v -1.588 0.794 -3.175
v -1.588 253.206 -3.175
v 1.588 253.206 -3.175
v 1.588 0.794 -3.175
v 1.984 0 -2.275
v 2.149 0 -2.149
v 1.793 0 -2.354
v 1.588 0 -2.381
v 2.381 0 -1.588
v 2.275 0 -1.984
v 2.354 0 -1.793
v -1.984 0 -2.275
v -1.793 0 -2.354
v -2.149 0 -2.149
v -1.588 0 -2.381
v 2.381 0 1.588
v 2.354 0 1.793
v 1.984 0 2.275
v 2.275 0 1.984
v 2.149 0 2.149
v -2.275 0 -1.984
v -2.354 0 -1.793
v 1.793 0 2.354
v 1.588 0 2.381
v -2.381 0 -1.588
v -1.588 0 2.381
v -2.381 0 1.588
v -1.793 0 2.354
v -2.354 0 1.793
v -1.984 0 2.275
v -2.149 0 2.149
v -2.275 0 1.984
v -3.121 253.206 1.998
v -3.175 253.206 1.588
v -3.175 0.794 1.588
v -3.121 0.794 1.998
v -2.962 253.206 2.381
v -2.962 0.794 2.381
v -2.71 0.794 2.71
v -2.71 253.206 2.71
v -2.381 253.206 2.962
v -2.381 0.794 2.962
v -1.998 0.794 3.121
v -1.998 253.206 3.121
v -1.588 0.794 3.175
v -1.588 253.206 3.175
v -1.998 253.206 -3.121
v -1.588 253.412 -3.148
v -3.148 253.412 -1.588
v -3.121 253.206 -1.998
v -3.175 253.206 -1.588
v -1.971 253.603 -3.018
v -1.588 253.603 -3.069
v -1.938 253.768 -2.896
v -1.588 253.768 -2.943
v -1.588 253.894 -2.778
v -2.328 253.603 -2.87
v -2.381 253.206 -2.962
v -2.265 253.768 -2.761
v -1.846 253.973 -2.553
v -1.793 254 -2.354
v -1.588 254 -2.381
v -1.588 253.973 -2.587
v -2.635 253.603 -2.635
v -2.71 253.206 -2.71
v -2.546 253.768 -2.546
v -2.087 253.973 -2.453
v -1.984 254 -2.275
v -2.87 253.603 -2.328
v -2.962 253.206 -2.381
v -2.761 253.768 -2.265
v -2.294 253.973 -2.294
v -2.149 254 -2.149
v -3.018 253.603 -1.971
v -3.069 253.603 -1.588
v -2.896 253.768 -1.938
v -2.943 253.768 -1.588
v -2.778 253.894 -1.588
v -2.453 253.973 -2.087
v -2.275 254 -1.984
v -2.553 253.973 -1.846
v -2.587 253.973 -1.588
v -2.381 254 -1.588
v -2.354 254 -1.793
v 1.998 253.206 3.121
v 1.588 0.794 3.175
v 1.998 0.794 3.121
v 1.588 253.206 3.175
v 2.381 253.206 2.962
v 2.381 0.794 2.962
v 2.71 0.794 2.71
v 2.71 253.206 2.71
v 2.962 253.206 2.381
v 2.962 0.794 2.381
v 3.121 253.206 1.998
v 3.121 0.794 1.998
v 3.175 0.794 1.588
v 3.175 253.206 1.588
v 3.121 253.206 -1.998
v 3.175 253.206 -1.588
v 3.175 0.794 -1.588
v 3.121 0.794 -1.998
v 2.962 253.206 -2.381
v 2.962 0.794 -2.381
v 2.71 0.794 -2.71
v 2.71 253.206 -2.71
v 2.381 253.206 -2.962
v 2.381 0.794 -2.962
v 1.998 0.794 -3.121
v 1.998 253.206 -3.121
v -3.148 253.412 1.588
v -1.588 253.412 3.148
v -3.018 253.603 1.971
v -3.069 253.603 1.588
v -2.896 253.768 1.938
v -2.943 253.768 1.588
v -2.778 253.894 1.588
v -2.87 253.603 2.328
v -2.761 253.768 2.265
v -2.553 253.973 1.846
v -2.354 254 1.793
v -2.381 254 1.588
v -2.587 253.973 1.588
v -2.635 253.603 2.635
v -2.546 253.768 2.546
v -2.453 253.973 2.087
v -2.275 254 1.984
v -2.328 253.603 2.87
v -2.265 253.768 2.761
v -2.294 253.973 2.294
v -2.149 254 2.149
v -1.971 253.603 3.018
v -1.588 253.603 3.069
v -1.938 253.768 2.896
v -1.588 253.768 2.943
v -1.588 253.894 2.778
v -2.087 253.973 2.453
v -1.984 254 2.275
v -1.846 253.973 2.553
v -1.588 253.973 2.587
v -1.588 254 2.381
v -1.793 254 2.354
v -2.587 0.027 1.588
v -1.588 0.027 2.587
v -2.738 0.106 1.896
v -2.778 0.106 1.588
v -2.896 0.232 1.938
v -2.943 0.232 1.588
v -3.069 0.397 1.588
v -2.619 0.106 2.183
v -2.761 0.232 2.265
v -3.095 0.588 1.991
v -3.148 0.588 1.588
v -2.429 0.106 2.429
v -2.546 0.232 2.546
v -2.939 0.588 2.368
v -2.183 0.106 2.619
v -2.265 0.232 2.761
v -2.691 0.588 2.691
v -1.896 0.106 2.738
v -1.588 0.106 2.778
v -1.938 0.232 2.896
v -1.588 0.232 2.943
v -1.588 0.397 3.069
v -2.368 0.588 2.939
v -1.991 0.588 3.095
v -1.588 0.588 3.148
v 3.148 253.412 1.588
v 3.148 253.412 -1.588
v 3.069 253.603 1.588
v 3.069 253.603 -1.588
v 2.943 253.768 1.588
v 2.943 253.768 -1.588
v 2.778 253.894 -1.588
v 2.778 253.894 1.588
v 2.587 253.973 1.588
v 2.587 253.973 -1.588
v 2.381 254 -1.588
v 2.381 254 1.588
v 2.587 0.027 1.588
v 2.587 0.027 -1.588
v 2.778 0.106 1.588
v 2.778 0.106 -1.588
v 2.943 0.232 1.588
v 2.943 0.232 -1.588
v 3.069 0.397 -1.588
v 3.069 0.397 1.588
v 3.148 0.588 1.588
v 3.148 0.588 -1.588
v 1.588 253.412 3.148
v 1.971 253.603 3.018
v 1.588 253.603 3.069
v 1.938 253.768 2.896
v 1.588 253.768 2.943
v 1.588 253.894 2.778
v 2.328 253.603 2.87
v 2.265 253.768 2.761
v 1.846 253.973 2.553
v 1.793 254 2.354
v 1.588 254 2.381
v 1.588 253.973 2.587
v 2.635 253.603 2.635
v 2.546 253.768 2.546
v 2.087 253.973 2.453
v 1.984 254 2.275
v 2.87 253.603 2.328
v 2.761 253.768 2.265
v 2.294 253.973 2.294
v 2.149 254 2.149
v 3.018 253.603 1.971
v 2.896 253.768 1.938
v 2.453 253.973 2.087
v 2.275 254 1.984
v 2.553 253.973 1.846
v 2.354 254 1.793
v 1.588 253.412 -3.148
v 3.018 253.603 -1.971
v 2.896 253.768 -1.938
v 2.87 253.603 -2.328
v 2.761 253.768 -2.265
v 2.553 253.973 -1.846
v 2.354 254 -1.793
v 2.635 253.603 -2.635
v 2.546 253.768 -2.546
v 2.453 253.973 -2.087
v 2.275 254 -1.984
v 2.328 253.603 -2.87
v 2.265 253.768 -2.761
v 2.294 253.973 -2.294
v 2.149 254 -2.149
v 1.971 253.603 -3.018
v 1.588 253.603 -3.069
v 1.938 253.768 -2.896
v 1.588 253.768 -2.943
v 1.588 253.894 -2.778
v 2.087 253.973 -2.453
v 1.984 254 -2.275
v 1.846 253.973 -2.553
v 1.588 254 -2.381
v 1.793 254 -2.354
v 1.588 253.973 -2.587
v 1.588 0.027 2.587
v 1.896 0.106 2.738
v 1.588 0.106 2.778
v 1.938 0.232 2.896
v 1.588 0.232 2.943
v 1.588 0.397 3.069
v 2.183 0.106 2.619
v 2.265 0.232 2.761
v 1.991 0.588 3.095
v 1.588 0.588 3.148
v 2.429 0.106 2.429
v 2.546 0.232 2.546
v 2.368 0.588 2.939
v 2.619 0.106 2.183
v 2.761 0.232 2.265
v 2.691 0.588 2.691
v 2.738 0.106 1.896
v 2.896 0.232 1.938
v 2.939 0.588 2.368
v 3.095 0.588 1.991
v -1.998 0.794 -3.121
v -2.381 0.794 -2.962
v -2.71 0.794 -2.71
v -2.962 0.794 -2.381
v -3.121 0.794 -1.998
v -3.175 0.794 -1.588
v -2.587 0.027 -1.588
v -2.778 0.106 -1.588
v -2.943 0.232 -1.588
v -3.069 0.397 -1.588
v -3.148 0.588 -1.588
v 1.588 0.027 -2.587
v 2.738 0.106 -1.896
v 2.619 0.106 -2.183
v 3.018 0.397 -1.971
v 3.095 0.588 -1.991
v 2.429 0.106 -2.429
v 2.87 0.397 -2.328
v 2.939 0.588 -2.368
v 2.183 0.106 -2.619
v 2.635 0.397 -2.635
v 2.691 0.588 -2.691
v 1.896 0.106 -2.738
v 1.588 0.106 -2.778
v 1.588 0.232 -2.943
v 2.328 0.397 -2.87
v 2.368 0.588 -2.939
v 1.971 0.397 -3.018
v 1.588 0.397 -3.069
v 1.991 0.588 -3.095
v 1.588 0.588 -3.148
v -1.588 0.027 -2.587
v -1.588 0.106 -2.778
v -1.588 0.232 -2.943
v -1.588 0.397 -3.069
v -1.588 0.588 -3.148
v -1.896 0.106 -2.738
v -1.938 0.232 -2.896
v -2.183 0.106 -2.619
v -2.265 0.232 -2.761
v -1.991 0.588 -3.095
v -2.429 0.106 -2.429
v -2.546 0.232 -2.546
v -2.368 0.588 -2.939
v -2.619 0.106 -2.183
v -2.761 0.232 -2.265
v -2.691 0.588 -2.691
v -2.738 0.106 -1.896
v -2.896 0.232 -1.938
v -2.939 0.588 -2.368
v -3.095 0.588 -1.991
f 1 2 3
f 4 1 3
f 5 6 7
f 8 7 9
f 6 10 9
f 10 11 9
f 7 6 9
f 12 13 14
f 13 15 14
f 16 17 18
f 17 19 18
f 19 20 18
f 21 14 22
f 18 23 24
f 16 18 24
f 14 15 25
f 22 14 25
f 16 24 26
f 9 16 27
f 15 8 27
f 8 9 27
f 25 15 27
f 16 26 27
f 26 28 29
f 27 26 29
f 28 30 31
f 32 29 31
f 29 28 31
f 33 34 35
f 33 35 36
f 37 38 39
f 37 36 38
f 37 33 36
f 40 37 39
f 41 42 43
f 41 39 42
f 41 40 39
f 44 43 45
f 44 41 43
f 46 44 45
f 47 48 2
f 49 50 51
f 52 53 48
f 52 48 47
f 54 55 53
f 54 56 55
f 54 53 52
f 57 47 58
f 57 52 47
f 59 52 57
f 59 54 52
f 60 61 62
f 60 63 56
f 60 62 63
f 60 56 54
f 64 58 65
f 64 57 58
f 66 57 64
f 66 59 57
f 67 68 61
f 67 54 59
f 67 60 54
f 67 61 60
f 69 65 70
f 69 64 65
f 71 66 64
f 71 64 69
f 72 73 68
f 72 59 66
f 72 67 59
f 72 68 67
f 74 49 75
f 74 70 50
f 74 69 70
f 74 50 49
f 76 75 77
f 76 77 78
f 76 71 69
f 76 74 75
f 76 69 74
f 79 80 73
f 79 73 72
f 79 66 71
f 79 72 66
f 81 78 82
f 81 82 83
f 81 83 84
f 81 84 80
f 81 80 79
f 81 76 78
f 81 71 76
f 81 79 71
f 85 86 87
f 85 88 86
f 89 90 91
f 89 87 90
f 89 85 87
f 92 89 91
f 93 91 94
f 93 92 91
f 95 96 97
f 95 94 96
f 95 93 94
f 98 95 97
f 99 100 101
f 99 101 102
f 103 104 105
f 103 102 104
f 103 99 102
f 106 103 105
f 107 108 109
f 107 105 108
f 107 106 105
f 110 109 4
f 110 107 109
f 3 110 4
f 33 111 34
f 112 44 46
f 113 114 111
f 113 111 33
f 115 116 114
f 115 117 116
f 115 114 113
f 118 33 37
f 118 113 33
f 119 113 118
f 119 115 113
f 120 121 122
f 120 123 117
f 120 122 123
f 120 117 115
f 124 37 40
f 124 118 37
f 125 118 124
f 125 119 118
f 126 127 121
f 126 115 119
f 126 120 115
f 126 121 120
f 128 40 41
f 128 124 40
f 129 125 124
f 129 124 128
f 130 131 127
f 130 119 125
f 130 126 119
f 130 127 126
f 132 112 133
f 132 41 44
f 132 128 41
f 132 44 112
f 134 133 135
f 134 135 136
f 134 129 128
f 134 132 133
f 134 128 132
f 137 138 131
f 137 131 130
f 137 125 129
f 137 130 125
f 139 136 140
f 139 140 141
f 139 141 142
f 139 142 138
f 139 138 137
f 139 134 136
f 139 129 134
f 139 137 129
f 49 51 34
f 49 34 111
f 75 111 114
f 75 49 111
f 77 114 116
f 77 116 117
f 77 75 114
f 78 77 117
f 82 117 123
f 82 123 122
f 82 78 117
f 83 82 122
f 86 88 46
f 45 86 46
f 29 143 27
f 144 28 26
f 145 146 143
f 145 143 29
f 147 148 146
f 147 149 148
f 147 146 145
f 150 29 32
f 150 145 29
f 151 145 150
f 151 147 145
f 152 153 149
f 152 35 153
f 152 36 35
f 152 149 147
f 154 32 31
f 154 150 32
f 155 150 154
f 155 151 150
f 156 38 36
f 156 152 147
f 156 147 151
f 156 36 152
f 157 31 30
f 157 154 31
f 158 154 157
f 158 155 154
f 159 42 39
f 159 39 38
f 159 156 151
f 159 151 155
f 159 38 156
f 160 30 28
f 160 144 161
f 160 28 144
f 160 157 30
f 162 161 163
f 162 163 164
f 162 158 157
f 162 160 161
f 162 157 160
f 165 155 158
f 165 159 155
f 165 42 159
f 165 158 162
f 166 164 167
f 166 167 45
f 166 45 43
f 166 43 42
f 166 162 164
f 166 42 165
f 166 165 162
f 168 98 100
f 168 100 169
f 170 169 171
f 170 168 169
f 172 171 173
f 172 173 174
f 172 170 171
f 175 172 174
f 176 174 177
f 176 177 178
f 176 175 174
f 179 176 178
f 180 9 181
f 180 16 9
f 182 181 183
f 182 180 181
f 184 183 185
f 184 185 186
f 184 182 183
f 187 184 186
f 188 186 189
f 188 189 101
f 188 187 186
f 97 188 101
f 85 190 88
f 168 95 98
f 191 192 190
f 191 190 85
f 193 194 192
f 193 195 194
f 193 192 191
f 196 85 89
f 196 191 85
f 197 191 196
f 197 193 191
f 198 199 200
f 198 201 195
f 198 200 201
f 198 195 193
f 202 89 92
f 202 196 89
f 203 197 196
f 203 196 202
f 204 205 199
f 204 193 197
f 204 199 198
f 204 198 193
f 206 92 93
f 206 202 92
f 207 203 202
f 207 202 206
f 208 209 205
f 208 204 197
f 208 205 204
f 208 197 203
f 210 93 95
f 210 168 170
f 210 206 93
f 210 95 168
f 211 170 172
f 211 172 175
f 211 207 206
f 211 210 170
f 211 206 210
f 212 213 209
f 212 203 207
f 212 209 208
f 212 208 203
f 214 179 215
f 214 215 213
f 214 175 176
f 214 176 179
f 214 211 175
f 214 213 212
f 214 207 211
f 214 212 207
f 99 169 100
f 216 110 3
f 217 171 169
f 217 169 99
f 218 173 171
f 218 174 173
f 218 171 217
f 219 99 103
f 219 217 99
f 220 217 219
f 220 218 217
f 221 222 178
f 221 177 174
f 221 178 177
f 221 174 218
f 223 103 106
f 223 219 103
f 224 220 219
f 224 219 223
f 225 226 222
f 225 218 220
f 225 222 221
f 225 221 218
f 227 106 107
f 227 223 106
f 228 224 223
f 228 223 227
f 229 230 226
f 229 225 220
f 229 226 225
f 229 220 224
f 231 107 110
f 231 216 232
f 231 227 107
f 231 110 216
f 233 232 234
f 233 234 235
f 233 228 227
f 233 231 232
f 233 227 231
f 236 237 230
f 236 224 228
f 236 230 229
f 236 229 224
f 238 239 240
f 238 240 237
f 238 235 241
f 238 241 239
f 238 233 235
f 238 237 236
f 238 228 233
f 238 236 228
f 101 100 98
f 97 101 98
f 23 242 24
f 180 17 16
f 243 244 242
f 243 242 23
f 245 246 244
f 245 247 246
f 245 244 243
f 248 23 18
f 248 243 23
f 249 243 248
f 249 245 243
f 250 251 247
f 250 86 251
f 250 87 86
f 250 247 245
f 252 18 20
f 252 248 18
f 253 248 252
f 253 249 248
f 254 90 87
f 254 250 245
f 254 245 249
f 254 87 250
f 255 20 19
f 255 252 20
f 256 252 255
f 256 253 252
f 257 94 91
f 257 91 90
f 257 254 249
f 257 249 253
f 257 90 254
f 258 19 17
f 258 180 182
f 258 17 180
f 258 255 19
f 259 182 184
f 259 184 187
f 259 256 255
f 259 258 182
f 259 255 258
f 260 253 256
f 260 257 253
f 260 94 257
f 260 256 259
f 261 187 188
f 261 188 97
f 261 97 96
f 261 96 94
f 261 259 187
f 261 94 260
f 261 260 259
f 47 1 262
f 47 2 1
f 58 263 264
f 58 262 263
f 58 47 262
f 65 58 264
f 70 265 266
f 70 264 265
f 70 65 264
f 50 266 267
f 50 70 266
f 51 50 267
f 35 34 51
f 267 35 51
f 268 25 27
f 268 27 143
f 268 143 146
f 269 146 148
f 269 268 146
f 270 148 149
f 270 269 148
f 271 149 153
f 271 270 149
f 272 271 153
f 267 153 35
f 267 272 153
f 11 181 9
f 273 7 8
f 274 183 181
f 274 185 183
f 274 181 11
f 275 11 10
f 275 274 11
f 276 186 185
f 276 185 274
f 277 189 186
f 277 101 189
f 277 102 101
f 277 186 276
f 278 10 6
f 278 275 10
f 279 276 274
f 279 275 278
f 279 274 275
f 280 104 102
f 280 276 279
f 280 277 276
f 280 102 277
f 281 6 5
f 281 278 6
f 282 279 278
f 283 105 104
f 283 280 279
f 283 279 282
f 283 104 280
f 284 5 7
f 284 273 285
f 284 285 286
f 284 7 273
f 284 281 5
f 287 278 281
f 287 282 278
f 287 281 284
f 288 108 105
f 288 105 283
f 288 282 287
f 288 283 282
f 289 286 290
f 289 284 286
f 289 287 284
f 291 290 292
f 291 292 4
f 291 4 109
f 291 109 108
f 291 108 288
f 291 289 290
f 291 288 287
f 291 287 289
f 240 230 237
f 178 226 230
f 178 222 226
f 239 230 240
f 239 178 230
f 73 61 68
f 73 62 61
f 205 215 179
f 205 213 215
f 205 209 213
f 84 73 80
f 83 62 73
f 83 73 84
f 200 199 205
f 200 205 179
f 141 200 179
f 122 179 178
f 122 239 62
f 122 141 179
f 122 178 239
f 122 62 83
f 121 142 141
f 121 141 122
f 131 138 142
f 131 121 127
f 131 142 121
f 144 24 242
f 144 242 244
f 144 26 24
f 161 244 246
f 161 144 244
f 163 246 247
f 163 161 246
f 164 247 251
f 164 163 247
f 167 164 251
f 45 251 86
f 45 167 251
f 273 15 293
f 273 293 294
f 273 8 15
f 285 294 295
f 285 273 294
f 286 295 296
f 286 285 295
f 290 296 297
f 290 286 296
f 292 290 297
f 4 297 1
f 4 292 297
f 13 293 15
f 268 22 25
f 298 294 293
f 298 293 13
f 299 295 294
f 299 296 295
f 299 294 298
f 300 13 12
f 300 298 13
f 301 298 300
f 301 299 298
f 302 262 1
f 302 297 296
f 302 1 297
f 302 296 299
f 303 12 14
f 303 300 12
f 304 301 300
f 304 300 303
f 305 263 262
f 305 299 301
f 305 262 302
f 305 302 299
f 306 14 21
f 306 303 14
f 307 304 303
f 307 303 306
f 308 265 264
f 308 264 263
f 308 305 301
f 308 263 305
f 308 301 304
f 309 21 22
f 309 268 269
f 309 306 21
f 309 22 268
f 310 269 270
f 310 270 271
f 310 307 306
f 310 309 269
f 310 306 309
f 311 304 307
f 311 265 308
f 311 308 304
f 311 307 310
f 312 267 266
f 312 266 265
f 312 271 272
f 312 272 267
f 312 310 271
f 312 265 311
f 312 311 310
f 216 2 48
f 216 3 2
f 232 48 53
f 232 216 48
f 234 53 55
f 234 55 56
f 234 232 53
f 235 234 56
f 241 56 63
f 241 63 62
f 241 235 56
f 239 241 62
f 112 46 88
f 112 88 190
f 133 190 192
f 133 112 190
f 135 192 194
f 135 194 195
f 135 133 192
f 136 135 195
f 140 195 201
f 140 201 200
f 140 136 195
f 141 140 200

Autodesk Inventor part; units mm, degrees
ref_plane "YZ Plane" through (0, 0, 0) normal (1, 0, 0) x (0, 1, 0)
ref_plane "XZ Plane" through (0, 0, 0) normal (0, 1, 0) x (-1, 0, 0)
ref_plane "XY Plane" through (0, 0, 0) normal (0, 0, 1) x (1, 0, 0)
sketch "Sketch1" plane through (0, 0, 0) normal (0, 1, 0) x (-1, 0, 0)
  line L0 (-3.175, 3.175) -> (3.175, 3.175)
  line L1 (3.175, 3.175) -> (3.175, -3.175)
  line L2 (3.175, -3.175) -> (-3.175, -3.175)
  line L3 (-3.175, -3.175) -> (-3.175, 3.175)
  line L4 (-3.175, 3.175) -> (3.175, -3.175) construction
  line L5 (3.175, 3.175) -> (-3.175, -3.175) construction
  point P0 (0, 0)
  dimension "d0" = 6.35
  dimension "d1" = 6.35
extrude "Extrusion1" add sketch "Sketch1" along normal blind 254
fillet "Fillet1" radius 1.5875 4 edges at (3.175, 127, 3.175) (-3.175, 127, -3.175) (-3.175, 127, 3.175) (3.175, 127, -3.175)
fillet "Fillet2" radius 0.7937 16 edges at (3.175, 0, 0) (2.71, 0, -2.71) (0, 0, -3.175) (-2.71, 0, -2.71) (-3.175, 0, 0) (-2.71, 0, 2.71) (0, 0, 3.175) (2.71, 0, 2.71) (0, 254, 3.175) (-2.71, 254, 2.71) (-3.175, 254, 0) (-2.71, 254, -2.71) (0, 254, -3.175) (2.71, 254, -2.71) (3.175, 254, 0) (2.71, 254, 2.71)
properties part number "10 inch hs shaft" material "Stainless Steel"
